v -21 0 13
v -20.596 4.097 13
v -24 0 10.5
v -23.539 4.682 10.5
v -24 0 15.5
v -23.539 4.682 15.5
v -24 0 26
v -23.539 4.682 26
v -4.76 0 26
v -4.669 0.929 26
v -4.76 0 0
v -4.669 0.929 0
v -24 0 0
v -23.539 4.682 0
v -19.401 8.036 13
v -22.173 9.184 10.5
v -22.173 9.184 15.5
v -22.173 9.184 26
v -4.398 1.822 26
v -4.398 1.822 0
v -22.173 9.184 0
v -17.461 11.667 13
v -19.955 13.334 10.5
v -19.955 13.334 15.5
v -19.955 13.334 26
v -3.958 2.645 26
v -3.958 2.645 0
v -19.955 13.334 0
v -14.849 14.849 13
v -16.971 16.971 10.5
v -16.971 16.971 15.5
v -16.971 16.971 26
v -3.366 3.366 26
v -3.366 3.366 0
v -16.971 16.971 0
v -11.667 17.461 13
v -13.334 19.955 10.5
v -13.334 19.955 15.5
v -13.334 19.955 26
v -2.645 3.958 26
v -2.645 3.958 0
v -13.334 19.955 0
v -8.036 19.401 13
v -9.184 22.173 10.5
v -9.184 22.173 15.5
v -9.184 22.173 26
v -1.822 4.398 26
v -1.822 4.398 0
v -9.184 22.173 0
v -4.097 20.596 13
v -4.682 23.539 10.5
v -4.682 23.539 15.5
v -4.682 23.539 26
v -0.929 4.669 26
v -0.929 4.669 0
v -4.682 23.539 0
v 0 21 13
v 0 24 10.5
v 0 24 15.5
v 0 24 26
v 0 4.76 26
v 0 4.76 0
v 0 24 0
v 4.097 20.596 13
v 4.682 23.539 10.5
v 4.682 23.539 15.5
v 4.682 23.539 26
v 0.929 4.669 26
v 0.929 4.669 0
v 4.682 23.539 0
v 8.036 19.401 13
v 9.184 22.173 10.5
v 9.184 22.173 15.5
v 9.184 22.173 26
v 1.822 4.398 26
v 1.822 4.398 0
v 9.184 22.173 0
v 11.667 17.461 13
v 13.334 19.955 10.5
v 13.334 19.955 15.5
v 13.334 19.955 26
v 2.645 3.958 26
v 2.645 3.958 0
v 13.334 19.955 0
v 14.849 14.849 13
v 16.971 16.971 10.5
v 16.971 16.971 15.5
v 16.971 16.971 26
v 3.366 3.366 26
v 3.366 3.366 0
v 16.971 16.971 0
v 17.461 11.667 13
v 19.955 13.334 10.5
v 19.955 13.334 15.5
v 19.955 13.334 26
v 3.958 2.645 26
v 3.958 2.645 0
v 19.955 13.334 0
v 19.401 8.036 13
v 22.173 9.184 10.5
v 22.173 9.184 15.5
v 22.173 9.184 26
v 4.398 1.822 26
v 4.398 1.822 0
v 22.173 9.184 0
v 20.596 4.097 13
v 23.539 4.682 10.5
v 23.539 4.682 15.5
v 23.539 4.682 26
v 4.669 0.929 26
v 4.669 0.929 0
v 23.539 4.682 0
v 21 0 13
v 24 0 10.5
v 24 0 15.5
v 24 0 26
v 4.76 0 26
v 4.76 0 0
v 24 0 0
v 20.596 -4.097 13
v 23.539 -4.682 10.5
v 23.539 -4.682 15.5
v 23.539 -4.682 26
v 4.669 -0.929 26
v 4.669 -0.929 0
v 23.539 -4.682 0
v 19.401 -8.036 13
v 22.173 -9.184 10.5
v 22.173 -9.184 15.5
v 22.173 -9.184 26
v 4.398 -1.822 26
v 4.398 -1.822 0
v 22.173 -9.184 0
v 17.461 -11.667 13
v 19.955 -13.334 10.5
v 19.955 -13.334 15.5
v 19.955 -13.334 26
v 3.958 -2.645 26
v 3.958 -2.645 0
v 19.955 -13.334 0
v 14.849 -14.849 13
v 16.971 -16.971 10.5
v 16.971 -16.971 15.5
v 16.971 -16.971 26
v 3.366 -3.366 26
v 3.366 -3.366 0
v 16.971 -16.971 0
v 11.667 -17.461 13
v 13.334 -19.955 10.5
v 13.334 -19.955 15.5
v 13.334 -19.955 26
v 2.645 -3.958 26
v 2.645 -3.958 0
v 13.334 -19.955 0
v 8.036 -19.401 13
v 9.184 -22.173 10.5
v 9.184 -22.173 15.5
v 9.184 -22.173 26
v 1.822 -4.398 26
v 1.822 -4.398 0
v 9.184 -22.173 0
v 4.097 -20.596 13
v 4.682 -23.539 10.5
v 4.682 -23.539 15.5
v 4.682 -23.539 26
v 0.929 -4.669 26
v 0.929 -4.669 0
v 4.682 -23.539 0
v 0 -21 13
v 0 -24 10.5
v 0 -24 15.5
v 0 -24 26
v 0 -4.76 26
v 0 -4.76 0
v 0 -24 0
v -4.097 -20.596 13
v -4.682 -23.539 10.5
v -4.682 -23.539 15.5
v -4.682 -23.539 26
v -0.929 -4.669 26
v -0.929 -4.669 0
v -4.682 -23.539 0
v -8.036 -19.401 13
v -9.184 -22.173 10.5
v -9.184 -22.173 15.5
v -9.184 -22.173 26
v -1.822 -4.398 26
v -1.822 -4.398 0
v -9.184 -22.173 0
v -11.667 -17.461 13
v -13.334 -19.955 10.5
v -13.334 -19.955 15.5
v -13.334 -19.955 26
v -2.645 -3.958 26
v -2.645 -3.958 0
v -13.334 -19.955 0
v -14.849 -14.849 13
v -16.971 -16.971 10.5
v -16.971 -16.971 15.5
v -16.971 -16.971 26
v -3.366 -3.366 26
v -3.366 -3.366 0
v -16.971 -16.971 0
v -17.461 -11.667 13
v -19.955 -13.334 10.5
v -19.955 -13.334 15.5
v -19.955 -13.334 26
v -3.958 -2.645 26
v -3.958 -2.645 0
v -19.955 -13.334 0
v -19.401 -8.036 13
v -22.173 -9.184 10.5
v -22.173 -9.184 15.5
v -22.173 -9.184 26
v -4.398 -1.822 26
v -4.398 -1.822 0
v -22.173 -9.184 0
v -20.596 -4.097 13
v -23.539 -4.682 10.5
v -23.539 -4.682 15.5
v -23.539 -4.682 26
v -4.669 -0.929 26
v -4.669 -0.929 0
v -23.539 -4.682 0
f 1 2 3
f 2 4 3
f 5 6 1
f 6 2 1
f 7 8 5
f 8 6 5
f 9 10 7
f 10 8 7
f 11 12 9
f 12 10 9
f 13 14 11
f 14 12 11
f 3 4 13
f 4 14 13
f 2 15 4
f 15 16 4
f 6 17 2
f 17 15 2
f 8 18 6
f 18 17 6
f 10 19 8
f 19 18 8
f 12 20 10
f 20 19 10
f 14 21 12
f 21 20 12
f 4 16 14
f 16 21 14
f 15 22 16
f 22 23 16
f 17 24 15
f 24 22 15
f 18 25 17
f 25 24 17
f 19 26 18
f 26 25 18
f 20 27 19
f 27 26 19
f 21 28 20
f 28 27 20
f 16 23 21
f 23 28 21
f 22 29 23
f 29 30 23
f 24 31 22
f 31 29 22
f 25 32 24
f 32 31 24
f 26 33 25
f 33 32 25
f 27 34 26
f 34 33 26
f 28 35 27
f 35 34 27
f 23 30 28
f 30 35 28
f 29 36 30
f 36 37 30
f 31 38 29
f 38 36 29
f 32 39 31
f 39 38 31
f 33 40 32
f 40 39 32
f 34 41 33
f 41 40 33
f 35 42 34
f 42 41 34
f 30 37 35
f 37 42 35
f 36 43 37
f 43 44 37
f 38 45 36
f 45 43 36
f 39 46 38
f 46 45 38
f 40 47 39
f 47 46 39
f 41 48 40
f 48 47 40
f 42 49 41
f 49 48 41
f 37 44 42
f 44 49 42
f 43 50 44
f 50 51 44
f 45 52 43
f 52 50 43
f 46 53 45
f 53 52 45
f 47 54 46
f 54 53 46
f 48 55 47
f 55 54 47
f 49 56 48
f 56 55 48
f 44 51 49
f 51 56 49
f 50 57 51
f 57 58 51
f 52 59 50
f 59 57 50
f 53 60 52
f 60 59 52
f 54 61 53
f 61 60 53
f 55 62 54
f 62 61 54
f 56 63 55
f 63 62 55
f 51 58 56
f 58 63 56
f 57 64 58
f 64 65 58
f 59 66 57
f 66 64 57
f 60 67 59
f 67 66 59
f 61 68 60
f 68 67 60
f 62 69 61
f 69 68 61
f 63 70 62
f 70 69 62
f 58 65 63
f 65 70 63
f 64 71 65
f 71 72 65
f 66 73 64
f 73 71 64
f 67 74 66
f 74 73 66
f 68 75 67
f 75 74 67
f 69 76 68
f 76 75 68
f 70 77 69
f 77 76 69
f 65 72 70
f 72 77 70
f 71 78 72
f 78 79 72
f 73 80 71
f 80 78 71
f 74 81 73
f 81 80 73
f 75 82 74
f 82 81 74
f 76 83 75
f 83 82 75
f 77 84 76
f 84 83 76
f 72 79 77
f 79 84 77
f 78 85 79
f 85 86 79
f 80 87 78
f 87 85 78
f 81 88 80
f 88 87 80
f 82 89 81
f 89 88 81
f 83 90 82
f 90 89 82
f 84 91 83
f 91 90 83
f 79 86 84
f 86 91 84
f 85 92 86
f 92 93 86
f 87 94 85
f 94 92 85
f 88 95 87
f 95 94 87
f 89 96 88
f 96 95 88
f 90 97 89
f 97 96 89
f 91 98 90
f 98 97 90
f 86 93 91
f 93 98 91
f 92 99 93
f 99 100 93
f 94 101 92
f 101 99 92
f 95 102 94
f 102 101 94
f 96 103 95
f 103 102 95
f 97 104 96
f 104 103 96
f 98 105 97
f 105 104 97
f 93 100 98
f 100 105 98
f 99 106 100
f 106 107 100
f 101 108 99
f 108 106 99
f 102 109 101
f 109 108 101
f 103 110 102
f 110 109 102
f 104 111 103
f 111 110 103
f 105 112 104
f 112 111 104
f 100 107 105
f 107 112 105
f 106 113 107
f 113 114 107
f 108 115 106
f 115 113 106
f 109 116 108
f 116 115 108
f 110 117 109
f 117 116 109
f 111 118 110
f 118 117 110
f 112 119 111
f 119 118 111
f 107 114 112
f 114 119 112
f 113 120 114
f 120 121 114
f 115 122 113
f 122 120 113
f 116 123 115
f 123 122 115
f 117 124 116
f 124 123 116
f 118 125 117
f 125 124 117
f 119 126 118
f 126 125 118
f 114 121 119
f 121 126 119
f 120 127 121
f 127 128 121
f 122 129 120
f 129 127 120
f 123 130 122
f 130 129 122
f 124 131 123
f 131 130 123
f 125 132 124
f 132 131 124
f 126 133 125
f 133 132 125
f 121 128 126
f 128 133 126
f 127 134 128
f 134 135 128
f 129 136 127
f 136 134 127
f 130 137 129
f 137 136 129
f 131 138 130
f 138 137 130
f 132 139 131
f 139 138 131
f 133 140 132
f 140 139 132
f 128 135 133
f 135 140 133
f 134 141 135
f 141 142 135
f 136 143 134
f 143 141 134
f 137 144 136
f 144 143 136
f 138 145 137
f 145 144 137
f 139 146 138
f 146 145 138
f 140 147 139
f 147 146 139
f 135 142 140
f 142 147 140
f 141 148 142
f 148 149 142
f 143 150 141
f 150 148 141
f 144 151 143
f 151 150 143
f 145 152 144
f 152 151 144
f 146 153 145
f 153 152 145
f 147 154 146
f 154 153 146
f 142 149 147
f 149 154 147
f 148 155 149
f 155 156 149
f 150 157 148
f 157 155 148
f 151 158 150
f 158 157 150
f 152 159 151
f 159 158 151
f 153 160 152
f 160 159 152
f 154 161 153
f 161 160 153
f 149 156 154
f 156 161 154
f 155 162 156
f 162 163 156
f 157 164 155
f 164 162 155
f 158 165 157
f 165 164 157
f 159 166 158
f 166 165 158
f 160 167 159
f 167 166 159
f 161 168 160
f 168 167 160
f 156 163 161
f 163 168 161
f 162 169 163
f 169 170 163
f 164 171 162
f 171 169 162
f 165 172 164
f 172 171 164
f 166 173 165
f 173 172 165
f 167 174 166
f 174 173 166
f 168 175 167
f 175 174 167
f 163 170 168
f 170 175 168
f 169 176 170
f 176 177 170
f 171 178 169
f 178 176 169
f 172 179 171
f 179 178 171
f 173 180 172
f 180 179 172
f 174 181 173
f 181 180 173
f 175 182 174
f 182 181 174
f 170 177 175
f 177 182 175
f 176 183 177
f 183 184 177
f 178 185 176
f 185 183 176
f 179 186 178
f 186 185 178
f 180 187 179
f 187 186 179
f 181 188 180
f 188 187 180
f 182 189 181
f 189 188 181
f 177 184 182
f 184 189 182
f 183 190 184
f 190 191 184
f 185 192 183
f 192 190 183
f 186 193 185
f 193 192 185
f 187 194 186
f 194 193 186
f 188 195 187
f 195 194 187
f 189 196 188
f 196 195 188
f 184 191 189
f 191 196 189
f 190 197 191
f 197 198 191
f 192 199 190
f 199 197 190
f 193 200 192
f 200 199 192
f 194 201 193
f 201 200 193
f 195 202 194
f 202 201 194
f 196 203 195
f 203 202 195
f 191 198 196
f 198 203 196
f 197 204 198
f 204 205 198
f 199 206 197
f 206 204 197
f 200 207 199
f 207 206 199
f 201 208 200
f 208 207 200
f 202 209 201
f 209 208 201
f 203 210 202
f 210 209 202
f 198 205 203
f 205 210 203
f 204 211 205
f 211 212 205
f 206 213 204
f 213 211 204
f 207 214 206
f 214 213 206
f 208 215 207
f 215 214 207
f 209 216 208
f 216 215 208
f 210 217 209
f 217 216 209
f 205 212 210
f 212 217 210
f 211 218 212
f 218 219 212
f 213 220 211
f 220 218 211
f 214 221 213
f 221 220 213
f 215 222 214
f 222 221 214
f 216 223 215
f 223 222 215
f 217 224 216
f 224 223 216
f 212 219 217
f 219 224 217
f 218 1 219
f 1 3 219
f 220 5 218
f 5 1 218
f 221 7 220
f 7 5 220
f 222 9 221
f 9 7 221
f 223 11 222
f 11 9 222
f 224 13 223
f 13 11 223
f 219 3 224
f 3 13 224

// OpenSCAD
$fn = 32;

// ----------------------------------------------------------------------
// Belt roller: 48 mm barrel, 26 mm wide, bore 9.52 mm
// ----------------------------------------------------------------------

// --- parameters (mm) ---
bore_d = 9.52;            // bore
barrel_d = 48;            // barrel diameter
roller_w = 26;            // roller width
groove_w = 5;             // guide groove width
groove_d = 3;             // guide groove depth

roller_profile = [[4.76, 0], [24, 0], [24, 10.5], [21, 13], [24, 15.5], [24, 26], [4.76, 26]];

/* the profile stays clear of the axis, so the bore comes out of the revolve */
rotate_extrude() polygon(roller_profile);
